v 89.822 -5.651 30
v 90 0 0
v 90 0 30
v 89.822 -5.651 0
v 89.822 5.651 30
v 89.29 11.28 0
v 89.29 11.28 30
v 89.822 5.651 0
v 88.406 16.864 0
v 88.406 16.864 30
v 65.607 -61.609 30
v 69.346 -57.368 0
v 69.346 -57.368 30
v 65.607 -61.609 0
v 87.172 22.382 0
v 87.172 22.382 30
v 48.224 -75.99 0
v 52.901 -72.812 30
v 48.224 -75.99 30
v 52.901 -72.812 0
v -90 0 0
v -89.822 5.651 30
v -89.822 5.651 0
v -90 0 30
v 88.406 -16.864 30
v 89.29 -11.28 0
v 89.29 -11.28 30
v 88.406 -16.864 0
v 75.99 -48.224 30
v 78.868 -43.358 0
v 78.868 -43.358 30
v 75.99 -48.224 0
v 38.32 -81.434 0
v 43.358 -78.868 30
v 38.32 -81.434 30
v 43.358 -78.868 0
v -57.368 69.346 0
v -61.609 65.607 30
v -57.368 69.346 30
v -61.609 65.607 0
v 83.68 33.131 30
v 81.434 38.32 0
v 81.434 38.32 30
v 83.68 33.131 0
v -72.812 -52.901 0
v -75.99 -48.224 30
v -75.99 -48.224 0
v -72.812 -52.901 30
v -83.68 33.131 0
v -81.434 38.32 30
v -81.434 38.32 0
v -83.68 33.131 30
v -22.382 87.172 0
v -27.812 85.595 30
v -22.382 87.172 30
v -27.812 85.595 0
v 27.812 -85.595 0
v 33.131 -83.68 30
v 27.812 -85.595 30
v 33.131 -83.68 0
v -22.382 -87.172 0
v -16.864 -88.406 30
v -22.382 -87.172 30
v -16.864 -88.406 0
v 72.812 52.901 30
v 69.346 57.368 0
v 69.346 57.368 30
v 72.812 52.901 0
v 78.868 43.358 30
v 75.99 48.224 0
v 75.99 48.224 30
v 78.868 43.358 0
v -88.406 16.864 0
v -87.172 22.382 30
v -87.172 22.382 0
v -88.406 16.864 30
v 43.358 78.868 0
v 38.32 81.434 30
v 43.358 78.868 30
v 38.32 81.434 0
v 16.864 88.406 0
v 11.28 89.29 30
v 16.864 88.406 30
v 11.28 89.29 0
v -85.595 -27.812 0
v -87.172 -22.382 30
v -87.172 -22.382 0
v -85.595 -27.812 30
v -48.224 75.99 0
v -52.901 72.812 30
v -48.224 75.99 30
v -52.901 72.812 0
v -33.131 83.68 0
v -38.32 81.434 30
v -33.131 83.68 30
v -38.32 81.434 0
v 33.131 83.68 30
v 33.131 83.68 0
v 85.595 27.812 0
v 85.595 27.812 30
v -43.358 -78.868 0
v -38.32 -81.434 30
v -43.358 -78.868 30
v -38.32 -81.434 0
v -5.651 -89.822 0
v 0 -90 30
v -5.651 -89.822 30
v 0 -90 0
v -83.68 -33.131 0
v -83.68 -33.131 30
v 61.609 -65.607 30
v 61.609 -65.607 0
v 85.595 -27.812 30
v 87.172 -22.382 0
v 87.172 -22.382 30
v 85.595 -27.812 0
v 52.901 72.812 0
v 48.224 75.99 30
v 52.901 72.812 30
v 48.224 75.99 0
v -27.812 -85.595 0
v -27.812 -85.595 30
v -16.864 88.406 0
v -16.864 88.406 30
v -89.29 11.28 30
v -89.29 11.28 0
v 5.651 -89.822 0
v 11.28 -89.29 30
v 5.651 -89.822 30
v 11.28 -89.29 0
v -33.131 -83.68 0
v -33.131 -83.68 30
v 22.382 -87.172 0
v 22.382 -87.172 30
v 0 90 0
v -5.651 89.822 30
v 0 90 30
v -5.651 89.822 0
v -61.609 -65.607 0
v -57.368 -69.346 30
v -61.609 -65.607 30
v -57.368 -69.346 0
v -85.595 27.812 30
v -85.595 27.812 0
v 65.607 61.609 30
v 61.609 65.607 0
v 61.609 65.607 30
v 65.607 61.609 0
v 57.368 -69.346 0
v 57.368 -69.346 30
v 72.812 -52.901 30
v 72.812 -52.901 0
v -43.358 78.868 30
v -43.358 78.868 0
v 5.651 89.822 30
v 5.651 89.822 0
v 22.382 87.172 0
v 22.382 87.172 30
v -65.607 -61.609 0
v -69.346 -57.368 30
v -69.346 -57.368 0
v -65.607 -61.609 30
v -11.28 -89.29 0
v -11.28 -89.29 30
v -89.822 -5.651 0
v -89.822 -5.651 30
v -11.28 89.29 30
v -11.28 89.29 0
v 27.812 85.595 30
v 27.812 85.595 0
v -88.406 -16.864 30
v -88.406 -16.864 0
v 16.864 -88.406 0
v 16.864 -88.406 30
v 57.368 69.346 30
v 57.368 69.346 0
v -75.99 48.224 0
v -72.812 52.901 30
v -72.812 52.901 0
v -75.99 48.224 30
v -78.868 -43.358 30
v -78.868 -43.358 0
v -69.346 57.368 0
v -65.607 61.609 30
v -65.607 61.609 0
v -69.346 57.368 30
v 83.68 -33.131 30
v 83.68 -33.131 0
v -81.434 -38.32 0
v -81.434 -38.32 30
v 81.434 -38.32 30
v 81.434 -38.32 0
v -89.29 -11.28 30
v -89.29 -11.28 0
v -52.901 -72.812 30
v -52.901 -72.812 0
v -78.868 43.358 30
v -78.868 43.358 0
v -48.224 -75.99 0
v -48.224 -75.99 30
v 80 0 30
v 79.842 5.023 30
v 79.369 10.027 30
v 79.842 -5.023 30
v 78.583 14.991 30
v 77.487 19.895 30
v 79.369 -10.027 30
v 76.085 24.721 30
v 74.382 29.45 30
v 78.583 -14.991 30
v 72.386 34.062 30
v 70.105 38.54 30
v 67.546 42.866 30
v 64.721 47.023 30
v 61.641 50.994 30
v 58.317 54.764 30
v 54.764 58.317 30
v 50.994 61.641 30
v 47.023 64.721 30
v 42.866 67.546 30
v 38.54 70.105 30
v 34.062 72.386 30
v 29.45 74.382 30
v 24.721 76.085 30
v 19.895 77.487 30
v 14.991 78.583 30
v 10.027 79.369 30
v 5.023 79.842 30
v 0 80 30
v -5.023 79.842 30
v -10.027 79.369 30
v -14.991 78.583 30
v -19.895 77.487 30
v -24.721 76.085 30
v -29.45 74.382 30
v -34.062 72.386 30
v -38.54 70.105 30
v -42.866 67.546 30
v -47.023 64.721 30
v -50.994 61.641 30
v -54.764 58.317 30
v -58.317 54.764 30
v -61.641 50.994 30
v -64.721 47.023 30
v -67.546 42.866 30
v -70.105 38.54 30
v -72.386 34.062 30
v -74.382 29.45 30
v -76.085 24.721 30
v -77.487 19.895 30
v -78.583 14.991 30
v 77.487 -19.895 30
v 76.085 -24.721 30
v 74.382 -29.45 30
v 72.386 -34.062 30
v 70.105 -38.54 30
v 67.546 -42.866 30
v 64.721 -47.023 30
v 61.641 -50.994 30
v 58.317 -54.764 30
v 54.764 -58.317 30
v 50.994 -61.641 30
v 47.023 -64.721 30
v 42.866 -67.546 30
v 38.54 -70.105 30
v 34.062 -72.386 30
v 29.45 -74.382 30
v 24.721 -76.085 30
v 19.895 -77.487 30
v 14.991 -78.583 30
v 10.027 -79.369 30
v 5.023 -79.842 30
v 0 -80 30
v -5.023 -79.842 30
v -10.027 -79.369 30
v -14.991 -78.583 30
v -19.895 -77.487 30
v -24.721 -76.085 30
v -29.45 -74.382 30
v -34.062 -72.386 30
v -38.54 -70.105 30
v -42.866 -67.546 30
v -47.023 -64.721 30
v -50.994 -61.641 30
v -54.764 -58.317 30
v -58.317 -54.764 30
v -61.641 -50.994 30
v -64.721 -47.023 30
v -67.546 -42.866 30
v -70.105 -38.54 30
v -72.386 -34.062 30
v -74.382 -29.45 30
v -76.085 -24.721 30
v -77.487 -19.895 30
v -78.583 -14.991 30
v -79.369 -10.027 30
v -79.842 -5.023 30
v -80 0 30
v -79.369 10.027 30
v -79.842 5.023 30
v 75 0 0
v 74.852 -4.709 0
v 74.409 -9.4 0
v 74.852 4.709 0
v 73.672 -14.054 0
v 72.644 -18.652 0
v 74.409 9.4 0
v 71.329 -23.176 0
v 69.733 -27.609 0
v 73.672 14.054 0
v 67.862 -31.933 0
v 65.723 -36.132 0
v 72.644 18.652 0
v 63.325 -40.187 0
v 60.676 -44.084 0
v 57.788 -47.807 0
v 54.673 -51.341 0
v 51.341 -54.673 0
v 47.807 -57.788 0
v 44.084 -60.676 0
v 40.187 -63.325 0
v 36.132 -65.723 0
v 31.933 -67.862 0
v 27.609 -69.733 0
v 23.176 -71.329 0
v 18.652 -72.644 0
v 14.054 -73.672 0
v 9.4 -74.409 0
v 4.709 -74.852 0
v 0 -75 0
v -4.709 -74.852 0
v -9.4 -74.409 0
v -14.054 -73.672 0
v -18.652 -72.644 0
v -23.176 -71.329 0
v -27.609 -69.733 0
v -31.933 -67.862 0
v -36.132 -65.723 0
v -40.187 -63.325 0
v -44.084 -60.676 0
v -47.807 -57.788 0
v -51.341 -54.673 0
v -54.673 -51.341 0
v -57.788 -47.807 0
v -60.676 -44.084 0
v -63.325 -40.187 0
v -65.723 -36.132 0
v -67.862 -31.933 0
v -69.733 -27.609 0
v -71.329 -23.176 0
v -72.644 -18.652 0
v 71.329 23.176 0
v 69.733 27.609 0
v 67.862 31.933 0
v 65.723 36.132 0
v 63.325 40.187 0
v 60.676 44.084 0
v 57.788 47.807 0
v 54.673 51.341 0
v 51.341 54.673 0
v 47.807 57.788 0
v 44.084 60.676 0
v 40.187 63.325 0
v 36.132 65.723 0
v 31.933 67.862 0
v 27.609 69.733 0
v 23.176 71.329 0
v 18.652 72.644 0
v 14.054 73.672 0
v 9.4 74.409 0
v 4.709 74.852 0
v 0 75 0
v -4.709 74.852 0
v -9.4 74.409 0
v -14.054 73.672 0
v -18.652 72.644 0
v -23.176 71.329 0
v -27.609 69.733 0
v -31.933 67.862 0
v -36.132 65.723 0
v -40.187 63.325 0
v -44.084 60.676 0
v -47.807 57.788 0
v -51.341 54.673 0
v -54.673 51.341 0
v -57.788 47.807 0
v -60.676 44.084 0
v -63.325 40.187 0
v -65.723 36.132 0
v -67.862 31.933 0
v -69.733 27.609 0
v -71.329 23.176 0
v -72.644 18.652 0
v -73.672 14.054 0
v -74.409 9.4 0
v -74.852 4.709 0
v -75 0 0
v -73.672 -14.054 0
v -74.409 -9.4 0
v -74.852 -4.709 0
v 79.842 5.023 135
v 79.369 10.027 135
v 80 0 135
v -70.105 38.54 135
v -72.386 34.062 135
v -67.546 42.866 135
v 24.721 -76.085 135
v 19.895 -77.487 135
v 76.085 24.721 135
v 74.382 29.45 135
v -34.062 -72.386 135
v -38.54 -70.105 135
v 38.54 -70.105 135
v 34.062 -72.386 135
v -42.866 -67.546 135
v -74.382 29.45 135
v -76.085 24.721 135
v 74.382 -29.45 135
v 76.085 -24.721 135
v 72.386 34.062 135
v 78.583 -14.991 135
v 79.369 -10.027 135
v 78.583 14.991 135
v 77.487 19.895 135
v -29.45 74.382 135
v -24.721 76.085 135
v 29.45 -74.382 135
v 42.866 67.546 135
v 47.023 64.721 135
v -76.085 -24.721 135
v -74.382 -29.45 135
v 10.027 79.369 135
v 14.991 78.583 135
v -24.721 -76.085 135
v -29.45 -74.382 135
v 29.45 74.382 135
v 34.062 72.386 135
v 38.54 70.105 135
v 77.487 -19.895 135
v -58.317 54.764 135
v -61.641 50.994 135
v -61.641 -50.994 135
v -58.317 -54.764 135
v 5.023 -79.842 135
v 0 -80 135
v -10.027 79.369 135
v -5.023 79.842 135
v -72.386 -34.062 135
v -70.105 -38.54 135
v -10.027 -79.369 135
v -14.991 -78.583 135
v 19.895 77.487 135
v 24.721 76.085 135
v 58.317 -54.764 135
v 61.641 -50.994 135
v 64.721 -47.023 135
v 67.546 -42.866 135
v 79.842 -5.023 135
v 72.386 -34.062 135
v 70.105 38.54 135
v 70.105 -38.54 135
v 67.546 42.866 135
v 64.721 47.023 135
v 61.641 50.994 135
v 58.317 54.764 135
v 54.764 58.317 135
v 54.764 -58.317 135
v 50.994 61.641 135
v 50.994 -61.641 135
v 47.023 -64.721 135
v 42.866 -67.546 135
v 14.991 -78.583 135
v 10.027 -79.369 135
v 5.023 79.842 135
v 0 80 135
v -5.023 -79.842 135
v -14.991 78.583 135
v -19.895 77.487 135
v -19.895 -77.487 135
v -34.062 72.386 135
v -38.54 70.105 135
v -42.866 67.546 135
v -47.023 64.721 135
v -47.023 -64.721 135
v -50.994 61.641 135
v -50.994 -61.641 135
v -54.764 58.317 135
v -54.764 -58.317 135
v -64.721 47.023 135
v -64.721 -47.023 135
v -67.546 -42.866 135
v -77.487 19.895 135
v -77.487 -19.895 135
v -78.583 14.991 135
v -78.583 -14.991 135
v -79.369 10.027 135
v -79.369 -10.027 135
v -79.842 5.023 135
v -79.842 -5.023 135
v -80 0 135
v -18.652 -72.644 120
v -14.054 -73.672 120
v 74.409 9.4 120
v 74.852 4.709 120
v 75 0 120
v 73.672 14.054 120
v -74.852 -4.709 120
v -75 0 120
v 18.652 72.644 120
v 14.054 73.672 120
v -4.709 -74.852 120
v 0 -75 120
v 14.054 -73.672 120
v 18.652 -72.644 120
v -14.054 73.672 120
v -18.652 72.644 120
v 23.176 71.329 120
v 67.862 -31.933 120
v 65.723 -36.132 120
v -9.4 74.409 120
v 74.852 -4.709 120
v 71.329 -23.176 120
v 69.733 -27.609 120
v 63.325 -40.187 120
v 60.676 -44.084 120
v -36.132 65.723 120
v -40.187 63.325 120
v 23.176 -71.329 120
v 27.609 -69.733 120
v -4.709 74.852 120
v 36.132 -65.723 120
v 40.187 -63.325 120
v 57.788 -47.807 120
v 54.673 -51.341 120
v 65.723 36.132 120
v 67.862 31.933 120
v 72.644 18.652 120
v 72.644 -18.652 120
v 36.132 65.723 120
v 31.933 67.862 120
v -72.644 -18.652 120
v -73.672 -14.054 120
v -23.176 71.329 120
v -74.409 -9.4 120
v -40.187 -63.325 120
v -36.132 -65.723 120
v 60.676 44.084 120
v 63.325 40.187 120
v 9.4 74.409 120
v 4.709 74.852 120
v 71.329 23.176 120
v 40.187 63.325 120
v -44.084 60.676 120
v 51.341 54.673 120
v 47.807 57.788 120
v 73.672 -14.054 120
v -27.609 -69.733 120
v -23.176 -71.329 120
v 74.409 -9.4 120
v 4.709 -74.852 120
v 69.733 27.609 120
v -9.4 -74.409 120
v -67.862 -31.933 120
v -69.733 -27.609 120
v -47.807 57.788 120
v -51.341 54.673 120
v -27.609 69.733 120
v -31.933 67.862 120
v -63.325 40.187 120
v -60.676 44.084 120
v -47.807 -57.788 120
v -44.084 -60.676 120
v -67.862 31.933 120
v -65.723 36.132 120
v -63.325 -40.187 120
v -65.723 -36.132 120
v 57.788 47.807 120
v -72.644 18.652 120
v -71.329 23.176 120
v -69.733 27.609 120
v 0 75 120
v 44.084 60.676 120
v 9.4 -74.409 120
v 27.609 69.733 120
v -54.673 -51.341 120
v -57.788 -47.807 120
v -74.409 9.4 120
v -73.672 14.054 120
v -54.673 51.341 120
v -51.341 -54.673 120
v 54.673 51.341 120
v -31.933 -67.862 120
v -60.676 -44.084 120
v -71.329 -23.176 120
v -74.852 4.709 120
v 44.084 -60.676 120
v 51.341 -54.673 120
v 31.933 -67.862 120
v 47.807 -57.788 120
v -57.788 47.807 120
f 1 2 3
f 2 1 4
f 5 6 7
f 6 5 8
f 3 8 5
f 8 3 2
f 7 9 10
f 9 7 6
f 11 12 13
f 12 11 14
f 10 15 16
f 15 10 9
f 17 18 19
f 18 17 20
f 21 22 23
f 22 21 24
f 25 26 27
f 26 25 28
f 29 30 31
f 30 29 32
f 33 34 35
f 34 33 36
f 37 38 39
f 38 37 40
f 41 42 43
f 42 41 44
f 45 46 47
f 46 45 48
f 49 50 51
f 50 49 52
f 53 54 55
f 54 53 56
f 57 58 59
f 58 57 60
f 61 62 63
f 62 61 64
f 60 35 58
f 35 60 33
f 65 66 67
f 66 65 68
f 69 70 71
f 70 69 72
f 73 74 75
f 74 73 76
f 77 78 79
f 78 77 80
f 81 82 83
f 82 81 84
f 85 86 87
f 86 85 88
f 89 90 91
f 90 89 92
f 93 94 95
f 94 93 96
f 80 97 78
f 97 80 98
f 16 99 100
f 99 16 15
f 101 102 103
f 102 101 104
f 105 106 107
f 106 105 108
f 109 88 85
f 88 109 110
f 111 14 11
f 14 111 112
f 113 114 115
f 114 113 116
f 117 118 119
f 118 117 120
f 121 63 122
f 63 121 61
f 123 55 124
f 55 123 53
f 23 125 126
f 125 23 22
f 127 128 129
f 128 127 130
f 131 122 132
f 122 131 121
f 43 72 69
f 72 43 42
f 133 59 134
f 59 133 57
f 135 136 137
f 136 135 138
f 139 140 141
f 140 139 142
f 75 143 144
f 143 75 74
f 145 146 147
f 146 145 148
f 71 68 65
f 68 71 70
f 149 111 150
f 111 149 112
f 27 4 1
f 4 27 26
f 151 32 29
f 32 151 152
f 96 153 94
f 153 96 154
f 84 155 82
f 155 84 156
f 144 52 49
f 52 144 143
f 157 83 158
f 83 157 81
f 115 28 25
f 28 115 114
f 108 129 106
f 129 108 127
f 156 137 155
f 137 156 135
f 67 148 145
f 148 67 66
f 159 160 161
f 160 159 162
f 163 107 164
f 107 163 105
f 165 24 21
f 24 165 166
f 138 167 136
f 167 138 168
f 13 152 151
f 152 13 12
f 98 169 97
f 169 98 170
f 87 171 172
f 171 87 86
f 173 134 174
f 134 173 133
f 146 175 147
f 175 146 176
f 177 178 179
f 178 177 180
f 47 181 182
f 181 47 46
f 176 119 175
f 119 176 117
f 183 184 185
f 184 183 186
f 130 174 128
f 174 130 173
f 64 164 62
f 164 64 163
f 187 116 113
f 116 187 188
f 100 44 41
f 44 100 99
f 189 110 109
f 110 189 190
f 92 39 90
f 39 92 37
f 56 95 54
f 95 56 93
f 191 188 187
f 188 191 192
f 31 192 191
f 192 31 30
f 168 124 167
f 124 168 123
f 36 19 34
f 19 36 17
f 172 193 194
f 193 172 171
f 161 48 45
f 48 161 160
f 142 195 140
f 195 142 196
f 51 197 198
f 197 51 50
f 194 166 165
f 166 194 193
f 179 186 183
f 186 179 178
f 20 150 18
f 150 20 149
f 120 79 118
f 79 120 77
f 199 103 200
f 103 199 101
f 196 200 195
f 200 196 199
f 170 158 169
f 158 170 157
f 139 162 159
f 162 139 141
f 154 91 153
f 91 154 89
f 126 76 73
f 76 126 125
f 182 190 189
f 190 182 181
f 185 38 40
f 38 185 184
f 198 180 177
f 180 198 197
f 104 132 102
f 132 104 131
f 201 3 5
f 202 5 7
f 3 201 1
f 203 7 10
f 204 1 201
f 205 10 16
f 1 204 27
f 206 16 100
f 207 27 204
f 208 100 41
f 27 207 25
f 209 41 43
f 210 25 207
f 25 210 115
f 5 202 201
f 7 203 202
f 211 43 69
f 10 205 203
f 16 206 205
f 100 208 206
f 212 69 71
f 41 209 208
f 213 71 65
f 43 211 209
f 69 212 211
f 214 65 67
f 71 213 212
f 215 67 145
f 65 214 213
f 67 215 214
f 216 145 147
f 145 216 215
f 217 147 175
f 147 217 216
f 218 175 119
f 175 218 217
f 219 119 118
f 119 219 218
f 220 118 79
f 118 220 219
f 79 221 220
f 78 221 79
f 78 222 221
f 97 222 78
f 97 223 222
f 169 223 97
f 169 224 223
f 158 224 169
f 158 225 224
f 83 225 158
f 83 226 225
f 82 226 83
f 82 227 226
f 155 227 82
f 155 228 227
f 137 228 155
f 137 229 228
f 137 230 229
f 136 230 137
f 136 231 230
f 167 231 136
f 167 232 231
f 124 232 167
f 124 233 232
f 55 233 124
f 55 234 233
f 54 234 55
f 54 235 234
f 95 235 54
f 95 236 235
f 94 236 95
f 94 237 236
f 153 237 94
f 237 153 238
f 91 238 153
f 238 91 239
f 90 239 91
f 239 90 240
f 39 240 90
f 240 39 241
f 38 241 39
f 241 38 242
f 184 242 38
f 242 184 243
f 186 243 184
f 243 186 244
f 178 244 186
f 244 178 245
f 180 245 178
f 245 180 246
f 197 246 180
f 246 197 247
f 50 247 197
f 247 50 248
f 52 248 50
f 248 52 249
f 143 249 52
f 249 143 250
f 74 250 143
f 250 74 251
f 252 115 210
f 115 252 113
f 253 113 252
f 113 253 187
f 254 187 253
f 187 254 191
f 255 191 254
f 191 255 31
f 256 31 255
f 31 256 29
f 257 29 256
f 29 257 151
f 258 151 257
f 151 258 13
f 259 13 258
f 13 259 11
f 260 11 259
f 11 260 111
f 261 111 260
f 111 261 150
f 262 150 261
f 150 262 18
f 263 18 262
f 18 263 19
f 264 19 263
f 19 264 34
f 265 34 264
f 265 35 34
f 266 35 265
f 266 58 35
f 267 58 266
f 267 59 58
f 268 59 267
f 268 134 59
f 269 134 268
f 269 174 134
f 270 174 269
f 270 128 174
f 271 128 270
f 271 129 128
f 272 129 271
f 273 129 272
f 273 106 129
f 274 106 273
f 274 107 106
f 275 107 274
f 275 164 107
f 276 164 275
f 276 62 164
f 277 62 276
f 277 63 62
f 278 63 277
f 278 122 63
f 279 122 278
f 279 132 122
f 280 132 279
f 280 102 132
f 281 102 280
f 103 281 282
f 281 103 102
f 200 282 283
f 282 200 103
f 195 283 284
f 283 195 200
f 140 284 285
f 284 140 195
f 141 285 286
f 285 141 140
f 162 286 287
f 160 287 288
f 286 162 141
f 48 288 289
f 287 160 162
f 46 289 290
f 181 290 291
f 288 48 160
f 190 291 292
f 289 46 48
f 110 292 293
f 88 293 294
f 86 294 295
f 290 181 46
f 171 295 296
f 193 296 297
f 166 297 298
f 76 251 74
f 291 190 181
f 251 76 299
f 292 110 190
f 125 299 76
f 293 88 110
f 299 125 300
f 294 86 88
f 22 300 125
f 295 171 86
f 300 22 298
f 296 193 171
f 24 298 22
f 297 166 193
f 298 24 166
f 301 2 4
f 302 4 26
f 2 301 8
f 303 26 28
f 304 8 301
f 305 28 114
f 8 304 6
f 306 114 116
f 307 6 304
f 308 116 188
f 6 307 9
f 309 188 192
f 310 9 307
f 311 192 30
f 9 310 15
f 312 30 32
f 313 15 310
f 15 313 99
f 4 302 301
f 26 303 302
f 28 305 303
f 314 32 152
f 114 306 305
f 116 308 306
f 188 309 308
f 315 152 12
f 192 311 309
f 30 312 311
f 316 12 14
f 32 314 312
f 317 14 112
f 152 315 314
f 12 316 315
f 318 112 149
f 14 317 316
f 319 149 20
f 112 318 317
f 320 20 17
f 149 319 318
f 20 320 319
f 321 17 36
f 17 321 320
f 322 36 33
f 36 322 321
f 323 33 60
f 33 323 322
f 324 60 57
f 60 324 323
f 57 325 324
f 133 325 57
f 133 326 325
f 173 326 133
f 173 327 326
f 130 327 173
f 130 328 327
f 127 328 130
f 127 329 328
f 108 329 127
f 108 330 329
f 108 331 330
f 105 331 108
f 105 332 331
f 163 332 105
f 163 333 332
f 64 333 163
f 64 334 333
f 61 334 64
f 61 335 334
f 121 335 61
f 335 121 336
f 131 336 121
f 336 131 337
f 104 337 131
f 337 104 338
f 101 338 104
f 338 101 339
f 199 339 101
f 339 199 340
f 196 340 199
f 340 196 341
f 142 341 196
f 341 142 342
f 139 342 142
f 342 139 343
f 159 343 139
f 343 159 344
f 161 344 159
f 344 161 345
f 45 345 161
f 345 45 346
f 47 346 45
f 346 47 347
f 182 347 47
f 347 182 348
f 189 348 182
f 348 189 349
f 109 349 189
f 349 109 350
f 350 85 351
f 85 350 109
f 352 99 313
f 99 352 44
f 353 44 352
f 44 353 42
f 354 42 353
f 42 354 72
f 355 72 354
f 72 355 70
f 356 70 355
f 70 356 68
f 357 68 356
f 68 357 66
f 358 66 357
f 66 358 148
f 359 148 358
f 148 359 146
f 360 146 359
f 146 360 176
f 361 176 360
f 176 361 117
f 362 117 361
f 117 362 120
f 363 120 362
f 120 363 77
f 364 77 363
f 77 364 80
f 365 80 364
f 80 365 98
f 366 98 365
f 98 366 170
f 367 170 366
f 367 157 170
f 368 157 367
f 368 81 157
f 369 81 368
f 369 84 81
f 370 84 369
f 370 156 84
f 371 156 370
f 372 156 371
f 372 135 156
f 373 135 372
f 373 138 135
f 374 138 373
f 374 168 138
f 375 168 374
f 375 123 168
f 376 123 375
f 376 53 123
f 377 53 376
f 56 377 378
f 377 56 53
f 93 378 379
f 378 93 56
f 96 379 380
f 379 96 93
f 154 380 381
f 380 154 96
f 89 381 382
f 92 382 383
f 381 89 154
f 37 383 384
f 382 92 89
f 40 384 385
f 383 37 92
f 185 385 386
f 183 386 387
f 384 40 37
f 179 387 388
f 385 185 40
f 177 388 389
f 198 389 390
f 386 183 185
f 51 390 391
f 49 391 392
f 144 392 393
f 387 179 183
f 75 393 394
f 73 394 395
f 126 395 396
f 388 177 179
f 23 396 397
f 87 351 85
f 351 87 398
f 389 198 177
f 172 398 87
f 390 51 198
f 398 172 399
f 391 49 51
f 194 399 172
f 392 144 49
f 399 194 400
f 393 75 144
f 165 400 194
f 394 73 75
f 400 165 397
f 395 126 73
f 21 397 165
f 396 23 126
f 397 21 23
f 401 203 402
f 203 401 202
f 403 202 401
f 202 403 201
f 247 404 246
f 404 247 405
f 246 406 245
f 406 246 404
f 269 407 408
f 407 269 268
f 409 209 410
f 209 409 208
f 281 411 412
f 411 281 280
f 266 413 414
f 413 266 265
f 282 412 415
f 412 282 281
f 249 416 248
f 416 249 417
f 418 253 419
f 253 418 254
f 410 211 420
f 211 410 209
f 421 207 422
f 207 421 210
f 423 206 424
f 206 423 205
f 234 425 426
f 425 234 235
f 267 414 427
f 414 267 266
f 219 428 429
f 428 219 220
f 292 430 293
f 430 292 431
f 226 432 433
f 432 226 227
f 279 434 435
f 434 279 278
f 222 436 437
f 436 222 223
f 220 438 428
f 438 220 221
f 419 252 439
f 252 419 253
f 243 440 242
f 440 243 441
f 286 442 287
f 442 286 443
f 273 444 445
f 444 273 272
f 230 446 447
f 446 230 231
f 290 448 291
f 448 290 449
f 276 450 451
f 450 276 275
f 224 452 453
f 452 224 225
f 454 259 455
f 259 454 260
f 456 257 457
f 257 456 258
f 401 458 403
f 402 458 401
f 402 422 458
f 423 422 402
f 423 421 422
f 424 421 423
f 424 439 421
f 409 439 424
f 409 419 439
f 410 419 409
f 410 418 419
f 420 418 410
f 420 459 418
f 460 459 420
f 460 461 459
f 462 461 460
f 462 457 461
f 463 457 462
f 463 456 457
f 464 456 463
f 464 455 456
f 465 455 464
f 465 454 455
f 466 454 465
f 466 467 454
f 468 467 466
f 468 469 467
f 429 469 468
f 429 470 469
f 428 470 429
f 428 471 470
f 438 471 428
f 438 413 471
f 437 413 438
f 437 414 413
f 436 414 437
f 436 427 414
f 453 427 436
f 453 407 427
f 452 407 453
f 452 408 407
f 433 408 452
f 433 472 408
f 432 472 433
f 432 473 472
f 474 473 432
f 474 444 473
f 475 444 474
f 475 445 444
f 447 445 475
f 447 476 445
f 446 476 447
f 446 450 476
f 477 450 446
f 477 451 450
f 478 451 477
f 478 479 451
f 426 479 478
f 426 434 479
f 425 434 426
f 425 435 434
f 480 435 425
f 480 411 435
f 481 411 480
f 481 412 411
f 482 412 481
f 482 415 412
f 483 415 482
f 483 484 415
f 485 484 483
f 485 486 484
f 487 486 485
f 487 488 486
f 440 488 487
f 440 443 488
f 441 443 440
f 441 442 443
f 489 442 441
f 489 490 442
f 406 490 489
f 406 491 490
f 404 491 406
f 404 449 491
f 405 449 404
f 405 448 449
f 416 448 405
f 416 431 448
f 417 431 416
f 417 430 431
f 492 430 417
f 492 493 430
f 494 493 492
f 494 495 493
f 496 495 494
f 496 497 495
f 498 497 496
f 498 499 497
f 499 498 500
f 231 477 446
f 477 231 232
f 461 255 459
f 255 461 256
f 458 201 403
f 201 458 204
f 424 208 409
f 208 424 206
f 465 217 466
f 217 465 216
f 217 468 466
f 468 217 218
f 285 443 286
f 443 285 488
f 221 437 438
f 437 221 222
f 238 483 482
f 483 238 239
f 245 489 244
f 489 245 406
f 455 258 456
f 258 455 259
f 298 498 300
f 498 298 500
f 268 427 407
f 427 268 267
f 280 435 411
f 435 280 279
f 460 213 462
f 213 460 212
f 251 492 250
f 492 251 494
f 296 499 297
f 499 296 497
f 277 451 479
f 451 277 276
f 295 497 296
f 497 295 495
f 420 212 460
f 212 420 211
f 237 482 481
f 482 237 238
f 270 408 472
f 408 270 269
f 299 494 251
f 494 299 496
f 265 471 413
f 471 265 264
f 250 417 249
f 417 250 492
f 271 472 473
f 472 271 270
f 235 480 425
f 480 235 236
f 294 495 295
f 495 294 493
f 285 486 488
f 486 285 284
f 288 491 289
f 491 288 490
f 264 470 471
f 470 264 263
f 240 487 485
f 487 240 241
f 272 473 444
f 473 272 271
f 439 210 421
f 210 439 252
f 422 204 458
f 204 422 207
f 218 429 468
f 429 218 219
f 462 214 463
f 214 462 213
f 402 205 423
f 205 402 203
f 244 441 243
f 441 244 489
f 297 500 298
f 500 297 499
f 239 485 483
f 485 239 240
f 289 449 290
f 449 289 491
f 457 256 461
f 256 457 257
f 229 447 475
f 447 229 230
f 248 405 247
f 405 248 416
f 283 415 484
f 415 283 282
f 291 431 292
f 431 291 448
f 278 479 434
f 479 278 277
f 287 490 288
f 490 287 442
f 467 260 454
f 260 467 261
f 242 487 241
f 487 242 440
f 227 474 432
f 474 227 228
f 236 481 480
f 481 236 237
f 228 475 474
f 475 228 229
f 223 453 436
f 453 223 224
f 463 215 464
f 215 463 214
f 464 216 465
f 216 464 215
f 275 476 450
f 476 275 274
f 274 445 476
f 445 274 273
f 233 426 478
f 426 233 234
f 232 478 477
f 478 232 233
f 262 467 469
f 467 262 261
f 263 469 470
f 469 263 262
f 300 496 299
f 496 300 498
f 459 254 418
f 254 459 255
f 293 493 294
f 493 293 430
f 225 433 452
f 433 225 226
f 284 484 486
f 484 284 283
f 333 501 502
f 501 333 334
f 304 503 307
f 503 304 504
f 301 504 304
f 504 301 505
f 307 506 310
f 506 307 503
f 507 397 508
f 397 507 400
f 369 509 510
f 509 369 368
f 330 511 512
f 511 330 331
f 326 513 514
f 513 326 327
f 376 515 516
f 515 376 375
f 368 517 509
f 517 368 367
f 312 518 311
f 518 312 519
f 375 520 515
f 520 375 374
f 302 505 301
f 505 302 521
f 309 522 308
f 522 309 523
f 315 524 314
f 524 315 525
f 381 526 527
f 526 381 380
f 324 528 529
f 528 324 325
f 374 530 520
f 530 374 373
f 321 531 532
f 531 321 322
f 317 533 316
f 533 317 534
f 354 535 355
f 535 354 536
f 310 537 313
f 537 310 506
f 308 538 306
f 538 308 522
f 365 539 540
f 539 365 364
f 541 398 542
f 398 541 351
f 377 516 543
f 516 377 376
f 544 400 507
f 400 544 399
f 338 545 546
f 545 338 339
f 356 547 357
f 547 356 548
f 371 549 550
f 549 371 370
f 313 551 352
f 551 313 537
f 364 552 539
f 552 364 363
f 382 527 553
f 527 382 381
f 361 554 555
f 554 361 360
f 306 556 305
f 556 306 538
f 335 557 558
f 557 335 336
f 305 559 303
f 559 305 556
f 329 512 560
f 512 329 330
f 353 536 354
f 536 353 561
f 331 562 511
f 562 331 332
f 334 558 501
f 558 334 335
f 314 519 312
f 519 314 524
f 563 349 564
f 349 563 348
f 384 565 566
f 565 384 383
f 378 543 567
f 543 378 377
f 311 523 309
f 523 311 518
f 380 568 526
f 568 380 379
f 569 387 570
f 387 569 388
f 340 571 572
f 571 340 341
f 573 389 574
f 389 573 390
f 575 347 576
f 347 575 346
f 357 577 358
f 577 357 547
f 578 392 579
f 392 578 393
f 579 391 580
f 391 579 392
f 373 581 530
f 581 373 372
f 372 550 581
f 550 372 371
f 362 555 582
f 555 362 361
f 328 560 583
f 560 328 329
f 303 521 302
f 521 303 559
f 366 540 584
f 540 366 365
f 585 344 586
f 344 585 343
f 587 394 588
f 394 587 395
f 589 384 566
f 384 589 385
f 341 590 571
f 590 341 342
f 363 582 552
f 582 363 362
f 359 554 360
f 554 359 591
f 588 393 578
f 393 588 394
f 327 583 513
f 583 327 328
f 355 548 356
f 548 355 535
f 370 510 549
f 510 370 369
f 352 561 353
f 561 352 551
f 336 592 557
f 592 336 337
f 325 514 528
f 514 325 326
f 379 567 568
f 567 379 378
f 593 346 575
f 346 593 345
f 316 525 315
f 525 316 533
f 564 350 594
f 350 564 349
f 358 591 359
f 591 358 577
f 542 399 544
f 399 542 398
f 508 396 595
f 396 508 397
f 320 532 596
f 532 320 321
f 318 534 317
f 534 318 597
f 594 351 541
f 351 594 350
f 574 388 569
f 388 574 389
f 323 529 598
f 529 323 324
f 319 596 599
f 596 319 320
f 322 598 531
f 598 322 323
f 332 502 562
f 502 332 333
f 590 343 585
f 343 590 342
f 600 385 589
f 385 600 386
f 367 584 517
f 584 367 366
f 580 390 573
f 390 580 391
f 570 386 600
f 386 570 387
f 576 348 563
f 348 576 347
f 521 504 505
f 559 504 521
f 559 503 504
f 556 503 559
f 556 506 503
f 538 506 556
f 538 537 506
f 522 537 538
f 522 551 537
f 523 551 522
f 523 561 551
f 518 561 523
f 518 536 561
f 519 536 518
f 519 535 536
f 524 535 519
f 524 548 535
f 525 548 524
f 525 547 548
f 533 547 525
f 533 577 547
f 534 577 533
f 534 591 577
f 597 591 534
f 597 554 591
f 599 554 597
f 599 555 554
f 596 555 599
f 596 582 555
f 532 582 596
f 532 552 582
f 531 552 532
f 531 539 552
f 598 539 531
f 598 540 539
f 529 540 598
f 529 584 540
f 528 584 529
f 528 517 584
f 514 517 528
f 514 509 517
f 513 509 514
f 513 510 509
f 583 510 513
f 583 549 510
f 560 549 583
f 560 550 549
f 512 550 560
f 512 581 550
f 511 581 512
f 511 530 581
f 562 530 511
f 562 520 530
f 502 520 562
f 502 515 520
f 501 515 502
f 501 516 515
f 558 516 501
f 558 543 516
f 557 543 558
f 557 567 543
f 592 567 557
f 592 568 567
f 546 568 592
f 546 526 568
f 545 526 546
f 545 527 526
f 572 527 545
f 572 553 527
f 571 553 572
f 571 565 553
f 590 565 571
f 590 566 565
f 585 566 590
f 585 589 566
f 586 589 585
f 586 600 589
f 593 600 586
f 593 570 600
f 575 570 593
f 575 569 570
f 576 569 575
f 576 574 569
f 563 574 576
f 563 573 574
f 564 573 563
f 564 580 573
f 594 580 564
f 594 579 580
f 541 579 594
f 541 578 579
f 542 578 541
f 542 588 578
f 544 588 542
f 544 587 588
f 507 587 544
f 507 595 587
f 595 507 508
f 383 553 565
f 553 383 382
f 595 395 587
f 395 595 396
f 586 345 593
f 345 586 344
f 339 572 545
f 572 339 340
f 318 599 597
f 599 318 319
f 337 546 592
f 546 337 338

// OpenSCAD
//Pipping Dimensions
//All measurements below in mm

//Main Pipe Diameter
D=80;
//Main Pipe Height
H=110;
//Top Edge Diameter
E=90;
//Top Edge Height
L=30;
//Inside Pipe Diameter
D2=75;
//Inside Pipe Height
H2=240;

module pipeout(){
color("green",1.0) union (){
    cylinder(L,E,E,Center=true,$fn=100);
    translate([0,0,80]) cylinder(H,D,D,center=true,$fn=100);}
    
}
module pipein(){
    cylinder(H2,D2,D2,center=true,$fn=100);}
    
    difference(){pipeout(); pipein();}
